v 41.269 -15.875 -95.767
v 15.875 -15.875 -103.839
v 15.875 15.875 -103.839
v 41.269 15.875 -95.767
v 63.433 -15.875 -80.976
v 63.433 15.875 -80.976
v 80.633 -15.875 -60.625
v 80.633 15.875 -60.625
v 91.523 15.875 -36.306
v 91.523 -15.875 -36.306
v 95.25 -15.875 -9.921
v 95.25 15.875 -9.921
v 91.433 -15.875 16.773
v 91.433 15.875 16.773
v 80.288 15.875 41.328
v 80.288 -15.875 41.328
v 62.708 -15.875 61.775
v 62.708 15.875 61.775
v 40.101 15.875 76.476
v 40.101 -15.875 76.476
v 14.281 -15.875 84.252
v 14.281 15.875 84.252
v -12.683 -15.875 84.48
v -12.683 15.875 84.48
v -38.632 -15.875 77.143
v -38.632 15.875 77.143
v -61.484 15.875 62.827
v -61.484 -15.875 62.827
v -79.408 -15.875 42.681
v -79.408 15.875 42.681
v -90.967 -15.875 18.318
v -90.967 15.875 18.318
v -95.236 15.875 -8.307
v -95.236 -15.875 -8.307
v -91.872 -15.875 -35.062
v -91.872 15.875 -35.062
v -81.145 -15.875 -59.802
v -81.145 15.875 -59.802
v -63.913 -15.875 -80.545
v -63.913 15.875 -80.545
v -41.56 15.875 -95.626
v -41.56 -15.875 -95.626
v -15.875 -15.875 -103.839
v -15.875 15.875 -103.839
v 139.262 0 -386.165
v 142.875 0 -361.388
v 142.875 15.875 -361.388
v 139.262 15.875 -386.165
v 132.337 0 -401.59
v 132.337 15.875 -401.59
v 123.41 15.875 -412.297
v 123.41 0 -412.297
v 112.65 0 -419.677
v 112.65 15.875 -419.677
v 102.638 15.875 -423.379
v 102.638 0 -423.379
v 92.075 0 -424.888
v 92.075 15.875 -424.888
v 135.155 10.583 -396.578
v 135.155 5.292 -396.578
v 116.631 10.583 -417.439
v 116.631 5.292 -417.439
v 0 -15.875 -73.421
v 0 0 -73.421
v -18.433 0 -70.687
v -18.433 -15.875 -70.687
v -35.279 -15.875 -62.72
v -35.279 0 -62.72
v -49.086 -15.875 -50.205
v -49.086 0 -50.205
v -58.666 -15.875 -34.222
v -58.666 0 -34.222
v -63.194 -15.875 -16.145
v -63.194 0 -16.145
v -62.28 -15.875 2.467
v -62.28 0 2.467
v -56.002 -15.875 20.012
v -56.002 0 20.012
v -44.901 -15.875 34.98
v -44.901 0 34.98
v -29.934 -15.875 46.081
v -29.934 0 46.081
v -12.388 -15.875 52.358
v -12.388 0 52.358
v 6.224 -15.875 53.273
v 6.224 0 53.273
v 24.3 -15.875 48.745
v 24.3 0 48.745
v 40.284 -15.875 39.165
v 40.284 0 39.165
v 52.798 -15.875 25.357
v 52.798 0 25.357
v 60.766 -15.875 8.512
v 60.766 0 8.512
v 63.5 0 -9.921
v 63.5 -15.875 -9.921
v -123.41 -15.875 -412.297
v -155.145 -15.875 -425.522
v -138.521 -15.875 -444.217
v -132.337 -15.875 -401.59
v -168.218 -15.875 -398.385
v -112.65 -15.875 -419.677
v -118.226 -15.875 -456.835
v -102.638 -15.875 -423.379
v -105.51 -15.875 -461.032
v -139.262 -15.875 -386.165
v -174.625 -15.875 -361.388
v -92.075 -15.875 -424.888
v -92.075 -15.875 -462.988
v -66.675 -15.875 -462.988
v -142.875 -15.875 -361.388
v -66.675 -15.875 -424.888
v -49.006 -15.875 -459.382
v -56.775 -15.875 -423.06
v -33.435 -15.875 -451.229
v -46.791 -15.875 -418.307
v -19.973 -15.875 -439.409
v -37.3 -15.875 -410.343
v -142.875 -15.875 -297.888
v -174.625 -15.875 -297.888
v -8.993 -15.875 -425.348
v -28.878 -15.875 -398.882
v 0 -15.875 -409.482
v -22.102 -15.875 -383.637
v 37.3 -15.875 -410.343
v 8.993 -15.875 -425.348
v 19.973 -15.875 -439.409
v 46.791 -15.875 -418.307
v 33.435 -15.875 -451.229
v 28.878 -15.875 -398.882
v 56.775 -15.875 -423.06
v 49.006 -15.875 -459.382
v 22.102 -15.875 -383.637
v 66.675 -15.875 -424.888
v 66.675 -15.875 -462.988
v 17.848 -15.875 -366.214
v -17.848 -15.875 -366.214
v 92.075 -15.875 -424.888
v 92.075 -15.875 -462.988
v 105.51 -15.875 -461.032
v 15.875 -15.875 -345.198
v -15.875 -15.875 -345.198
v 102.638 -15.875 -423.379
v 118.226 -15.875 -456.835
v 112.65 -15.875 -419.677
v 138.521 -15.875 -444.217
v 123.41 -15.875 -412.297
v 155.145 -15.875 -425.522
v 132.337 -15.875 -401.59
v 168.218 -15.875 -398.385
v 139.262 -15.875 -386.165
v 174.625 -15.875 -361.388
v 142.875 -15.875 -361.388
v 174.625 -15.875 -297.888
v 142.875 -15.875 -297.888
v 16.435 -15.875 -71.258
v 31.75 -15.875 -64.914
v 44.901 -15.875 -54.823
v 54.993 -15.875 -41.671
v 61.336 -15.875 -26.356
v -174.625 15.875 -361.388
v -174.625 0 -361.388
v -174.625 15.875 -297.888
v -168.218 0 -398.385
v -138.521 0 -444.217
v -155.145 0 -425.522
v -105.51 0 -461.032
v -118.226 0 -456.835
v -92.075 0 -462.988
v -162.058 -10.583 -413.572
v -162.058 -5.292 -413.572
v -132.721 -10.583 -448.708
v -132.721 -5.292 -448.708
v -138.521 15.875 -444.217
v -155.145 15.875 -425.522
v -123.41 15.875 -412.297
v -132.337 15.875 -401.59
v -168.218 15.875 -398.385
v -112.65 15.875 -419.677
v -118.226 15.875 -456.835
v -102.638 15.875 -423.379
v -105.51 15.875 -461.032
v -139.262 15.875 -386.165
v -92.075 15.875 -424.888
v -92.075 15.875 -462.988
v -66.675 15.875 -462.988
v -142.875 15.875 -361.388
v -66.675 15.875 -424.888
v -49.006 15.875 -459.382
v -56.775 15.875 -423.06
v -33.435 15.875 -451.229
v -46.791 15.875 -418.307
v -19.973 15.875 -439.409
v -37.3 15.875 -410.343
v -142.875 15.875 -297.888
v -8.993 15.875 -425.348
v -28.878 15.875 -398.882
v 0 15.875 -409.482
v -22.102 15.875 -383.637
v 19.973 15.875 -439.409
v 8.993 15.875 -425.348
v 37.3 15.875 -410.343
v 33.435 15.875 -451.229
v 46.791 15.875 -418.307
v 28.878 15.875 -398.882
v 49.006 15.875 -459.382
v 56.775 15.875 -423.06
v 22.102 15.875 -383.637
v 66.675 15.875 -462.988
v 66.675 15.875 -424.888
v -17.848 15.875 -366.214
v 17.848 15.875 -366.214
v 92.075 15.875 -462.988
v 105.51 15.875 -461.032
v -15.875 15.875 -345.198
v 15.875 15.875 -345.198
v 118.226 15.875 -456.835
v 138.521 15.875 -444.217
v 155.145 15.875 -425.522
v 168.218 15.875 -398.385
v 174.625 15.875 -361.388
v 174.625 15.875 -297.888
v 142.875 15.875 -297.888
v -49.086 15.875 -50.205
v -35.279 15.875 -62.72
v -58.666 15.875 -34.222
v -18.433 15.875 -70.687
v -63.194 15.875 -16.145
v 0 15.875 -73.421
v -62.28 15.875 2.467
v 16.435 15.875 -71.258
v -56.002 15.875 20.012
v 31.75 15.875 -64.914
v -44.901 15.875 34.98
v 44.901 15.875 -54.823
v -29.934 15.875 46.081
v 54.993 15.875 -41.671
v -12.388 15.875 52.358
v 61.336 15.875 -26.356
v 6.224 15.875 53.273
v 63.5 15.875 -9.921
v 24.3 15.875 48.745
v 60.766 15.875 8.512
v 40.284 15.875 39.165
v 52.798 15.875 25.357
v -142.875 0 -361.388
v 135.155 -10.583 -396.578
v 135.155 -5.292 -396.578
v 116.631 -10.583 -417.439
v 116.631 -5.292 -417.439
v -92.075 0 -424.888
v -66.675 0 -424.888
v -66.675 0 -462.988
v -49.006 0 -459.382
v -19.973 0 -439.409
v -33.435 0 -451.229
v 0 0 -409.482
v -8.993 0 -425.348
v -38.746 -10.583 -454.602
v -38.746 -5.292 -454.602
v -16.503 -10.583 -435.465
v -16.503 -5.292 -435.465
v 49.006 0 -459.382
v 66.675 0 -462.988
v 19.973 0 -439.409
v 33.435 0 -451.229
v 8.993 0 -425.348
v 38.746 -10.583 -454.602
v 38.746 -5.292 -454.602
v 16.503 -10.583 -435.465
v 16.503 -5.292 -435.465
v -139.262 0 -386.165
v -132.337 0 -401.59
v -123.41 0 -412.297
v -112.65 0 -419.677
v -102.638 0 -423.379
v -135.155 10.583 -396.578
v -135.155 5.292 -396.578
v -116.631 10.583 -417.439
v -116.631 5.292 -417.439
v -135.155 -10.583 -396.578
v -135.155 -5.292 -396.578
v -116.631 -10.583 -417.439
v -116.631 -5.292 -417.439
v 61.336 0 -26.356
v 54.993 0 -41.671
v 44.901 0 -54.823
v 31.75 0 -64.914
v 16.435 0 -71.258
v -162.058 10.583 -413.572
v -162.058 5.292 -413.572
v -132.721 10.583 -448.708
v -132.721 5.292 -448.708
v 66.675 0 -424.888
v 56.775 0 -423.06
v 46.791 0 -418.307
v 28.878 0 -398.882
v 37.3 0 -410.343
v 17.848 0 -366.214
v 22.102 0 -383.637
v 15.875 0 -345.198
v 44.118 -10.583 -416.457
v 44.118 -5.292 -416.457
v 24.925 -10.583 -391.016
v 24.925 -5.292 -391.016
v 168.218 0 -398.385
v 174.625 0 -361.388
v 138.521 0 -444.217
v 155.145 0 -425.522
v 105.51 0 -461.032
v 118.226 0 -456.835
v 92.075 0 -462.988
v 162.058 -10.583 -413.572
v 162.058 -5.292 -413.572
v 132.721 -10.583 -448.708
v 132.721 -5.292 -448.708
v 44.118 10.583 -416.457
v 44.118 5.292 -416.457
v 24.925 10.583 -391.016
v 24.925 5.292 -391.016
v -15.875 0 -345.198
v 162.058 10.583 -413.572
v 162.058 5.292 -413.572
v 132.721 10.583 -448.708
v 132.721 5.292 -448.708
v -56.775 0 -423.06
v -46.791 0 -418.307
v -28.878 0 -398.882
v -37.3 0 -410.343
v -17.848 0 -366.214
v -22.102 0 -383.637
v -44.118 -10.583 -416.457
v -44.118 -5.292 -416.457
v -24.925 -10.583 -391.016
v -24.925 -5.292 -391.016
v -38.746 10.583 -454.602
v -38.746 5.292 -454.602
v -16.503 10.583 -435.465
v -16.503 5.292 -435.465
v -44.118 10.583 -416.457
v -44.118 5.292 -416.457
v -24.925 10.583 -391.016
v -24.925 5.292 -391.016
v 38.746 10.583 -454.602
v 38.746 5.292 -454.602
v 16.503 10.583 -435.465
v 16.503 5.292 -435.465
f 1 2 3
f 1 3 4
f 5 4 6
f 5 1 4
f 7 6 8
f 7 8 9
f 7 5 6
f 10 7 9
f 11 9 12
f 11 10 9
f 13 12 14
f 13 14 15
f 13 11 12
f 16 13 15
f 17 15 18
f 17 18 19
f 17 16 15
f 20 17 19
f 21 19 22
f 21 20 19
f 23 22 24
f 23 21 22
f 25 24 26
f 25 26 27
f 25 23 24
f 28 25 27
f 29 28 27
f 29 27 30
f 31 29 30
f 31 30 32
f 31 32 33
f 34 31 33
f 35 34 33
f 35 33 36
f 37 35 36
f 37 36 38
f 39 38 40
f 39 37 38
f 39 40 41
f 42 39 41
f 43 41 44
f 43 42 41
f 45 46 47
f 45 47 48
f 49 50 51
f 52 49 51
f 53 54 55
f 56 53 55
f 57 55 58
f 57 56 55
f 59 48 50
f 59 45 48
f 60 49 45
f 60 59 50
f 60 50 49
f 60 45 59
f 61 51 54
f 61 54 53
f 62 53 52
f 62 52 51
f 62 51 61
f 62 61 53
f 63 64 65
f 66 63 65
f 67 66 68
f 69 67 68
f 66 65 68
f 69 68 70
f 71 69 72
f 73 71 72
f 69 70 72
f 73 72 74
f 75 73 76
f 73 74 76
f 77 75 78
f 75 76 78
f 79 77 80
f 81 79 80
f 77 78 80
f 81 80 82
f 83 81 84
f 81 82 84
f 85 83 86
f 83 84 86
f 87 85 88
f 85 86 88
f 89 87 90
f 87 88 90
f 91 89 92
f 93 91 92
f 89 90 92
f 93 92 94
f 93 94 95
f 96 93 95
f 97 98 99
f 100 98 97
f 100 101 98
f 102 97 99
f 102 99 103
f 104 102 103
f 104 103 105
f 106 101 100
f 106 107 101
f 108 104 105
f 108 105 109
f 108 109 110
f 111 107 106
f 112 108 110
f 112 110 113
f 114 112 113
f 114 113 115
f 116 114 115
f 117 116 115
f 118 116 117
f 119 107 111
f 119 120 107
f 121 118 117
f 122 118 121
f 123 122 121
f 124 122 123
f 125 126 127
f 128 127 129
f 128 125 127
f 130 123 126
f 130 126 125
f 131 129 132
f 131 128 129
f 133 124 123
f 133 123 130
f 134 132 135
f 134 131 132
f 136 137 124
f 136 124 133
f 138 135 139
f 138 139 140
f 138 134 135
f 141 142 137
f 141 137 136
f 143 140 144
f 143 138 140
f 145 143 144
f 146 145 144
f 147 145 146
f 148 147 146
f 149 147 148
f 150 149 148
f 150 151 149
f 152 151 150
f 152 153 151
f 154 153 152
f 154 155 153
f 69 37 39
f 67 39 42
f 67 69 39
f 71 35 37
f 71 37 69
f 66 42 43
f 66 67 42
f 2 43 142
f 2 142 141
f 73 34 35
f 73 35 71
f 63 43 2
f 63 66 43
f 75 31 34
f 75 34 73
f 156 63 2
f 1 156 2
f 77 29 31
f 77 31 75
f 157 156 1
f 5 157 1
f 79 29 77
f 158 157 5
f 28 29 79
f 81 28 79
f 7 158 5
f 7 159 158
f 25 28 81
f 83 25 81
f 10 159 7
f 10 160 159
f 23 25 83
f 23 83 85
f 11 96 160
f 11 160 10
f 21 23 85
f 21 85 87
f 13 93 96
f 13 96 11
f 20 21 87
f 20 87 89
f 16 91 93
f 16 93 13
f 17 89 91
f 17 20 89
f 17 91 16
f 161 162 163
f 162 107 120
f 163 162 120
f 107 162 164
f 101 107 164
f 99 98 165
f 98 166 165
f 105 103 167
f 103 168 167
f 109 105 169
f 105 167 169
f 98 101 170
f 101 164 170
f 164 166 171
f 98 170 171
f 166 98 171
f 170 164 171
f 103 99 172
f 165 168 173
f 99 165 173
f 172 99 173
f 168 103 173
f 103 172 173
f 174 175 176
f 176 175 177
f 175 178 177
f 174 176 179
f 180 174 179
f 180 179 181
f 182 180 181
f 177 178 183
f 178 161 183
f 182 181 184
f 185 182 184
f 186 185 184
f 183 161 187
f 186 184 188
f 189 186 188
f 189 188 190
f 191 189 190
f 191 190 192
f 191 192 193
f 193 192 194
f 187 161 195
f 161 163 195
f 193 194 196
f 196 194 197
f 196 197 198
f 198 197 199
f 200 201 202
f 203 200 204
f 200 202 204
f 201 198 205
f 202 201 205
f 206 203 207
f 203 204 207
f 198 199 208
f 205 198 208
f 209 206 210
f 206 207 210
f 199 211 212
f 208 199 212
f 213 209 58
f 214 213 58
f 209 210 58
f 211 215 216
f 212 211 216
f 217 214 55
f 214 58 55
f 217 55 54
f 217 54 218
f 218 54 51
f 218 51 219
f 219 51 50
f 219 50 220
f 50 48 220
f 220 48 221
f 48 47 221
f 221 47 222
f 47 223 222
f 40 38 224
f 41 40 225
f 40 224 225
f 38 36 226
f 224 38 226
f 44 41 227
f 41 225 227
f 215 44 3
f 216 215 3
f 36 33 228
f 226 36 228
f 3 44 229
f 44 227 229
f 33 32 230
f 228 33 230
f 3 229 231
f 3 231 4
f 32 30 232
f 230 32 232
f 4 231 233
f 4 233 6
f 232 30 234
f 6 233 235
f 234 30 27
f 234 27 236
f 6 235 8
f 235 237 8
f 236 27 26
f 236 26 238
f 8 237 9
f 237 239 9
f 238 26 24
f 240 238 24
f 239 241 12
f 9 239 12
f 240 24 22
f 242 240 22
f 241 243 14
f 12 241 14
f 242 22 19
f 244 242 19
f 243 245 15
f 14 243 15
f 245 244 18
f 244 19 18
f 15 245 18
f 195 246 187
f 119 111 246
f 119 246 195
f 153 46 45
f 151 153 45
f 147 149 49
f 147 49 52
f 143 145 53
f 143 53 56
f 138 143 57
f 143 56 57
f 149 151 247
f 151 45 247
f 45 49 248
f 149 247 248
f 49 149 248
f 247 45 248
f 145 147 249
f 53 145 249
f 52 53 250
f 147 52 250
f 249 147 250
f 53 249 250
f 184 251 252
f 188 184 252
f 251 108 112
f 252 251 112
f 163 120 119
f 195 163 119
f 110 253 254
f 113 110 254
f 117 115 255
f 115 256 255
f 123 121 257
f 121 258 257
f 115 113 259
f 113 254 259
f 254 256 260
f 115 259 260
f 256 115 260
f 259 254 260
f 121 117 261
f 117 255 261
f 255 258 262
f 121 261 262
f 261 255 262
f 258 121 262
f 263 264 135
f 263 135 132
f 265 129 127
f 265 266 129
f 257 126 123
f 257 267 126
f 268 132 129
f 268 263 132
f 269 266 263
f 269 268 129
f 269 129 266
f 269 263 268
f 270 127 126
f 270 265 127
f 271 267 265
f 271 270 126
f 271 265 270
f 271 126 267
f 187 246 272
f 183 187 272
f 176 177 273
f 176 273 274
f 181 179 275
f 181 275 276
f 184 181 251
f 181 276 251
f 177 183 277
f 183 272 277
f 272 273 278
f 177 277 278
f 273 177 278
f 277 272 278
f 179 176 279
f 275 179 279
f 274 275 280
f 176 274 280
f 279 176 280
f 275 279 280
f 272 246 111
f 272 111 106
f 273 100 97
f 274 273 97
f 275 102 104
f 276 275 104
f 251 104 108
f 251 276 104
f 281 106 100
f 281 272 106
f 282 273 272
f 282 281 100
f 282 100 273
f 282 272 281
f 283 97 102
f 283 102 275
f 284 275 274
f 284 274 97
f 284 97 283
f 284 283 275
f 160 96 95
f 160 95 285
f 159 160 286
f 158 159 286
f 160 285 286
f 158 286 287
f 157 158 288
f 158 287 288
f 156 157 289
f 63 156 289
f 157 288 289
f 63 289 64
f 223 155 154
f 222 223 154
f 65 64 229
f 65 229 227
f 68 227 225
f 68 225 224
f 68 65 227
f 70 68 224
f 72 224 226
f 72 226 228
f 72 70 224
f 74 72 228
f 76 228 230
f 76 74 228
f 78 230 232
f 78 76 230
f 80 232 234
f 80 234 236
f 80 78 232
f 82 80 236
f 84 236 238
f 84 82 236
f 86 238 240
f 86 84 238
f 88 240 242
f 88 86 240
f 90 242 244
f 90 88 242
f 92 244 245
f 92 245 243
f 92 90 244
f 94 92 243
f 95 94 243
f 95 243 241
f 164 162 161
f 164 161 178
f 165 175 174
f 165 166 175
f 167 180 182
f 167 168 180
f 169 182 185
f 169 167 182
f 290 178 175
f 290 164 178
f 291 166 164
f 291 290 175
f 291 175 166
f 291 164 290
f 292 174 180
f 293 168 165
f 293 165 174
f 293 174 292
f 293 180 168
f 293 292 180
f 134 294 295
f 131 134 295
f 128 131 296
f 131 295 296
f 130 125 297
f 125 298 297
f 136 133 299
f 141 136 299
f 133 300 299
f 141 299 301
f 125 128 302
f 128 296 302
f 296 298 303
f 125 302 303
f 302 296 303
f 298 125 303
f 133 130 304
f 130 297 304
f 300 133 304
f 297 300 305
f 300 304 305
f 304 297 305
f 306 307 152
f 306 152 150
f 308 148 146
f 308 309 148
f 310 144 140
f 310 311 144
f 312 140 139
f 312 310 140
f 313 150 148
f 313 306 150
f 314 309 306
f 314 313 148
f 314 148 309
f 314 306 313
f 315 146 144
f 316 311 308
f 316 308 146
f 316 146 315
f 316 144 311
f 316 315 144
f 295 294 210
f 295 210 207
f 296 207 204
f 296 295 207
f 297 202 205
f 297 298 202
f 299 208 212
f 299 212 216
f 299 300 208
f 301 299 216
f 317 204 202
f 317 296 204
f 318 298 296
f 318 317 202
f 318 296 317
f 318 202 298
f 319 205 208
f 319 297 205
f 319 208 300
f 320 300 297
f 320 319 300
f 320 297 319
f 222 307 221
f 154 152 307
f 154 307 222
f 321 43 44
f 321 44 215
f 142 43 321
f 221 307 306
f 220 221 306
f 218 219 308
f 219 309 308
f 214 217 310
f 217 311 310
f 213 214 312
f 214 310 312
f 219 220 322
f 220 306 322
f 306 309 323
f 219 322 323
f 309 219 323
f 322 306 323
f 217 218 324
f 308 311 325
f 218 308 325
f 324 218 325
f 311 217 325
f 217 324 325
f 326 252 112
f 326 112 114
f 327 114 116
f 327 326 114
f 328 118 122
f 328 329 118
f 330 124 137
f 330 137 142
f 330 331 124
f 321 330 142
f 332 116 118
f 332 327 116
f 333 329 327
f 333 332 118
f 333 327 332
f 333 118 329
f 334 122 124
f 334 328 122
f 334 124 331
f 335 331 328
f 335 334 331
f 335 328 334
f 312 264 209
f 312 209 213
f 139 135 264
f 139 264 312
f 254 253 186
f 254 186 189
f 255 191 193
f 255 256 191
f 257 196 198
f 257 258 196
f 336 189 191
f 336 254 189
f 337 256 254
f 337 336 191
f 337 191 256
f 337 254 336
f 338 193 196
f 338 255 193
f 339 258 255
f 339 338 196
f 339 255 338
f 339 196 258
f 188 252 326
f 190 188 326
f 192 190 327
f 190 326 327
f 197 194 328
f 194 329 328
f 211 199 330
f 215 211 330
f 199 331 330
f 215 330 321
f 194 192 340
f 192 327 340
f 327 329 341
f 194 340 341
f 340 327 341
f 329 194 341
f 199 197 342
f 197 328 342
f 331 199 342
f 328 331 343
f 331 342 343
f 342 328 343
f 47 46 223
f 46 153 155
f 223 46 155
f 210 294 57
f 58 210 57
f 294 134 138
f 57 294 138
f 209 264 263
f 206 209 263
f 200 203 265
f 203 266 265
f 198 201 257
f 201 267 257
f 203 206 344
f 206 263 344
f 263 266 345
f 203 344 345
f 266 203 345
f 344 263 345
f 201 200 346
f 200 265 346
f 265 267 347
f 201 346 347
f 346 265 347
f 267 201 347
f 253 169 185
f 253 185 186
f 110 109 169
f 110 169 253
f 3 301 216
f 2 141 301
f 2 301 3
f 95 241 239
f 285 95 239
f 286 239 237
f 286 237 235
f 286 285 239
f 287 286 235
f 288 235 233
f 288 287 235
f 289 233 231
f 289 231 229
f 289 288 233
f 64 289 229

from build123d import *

# Parameters (mm, degrees)
F0_W     = 25.4
F0_H     = 38.1
F0_W_2   = 31.75
F0_H_2   = 63.5
F1_DEPTH = 15.875


with BuildPart() as f1:
    # F0 (on Front) → F1 (new body, symmetric)
    with BuildSketch(Plane.XZ):
        with BuildLine():
            Line((-15.875, -103.8391655019), (-15.875, -345.1981674205))
            Line((-15.875, -345.1981674205), (0, -345.1981674205))
            Line((0, -345.1981674205), (0, -105.1713989452))
            ThreePointArc((0, -105.1713989452), (-7.9654012916, -104.8377562407), (-15.875, -103.8391655019))
        make_face()
        with BuildLine():
            add(Edge.make_bspline(
                [(0, -409.482145582), (-10.3991862171, -388.0156164118), (-15.7271620535, -363.9765002128), (-15.875, -345.1981674205)],
                knots=[81.5477604067, 81.5477604067, 81.5477604067, 81.5477604067, 143.8364349915, 143.8364349915, 143.8364349915, 143.8364349915], degree=3))
            add(Edge.make_bspline(
                [(-66.675, -424.8878848455), (-44.6960218251, -423.8382875919), (-17.5926852971, -402.3276865482), (-15.875, -345.1981674205)],
                knots=[0, 0, 0, 0, 94.5044499655, 94.5044499655, 94.5044499655, 94.5044499655], degree=3))
            Line((-66.675, -424.8878848455), (-66.675, -462.9878848455))
            add(Edge.make_bspline(
                [(-66.675, -462.9878848455), (-35.9209941881, -461.2803468487), (-13.6145190391, -437.5859283193), (0, -409.482145582)],
                knots=[0, 0, 0, 0, 81.5477604067, 81.5477604067, 81.5477604067, 81.5477604067], degree=3))
        make_face()
        with BuildLine():
            Line((0, -345.1981674205), (-15.875, -345.1981674205))
            add(Edge.make_bspline(
                [(0, -409.482145582), (-10.3991862171, -388.0156164118), (-15.7271620535, -363.9765002128), (-15.875, -345.1981674205)],
                knots=[81.5477604067, 81.5477604067, 81.5477604067, 81.5477604067, 143.8364349915, 143.8364349915, 143.8364349915, 143.8364349915], degree=3))
            add(Edge.make_bspline(
                [(0, -409.482145582), (10.3991862171, -388.0156164118), (15.7271620535, -363.9765002128), (15.875, -345.1981674205)],
                knots=[81.5477604067, 81.5477604067, 81.5477604067, 81.5477604067, 143.8364349915, 143.8364349915, 143.8364349915, 143.8364349915], degree=3))
            Line((15.875, -345.1981674205), (0, -345.1981674205))
        make_face()
        with BuildLine():
            Line((0, -105.1713989452), (0, -345.1981674205))
            Line((0, -345.1981674205), (15.875, -345.1981674205))
            Line((15.875, -345.1981674205), (15.875, -103.8391655019))
            ThreePointArc((15.875, -103.8391655019), (7.9654012916, -104.8377562407), (0, -105.1713989452))
        make_face()
        with BuildLine():
            ThreePointArc((95.25, -9.9213989452), (-61.483610621, 62.8269902123), (-15.875, -103.8391655019))
            Line((-15.875, -103.8391655019), (-15.875, -91.1981674205))
            Line((-15.875, -91.1981674205), (0, -91.1981674205))
            Line((0, -91.1981674205), (15.875, -91.1981674205))
            Line((15.875, -91.1981674205), (15.875, -103.8391655019))
            ThreePointArc((15.875, -103.8391655019), (72.7483891574, -71.4050095662), (95.25, -9.9213989452))
        make_face()
        with BuildLine():
            ThreePointArc((63.5, -9.9213989452), (44.9012806053, -54.8226795505), (0, -73.4213989452))
            ThreePointArc((0, -73.4213989452), (-44.9012806053, 34.9798816602), (63.5, -9.9213989452))
        make_face(mode=Mode.SUBTRACT)
        with BuildLine():
            Line((-15.875, -91.1981674205), (-15.875, -103.8391655019))
            ThreePointArc((-15.875, -103.8391655019), (-7.9654012916, -104.8377562407), (0, -105.1713989452))
            Line((0, -105.1713989452), (0, -91.1981674205))
            Line((0, -91.1981674205), (-15.875, -91.1981674205))
        make_face()
        with Locations((-79.375, -443.9378848455)):
            Rectangle(F0_W, F0_H)
        with BuildLine():
            add(Edge.make_bspline(
                [(0, -409.482145582), (10.3991862171, -388.0156164118), (15.7271620535, -363.9765002128), (15.875, -345.1981674205)],
                knots=[81.5477604067, 81.5477604067, 81.5477604067, 81.5477604067, 143.8364349915, 143.8364349915, 143.8364349915, 143.8364349915], degree=3))
            add(Edge.make_bspline(
                [(66.675, -462.9878848455), (35.9209941881, -461.2803468487), (13.6145190391, -437.5859283193), (0, -409.482145582)],
                knots=[0, 0, 0, 0, 81.5477604067, 81.5477604067, 81.5477604067, 81.5477604067], degree=3))
            Line((66.675, -462.9878848455), (66.675, -424.8878848455))
            add(Edge.make_bspline(
                [(66.675, -424.8878848455), (44.6960218251, -423.8382875919), (17.5926852971, -402.3276865482), (15.875, -345.1981674205)],
                knots=[0, 0, 0, 0, 94.5044499655, 94.5044499655, 94.5044499655, 94.5044499655], degree=3))
        make_face()
        with BuildLine():
            Line((0, -91.1981674205), (0, -105.1713989452))
            ThreePointArc((0, -105.1713989452), (7.9654012916, -104.8377562407), (15.875, -103.8391655019))
            Line((15.875, -103.8391655019), (15.875, -91.1981674205))
            Line((15.875, -91.1981674205), (0, -91.1981674205))
        make_face()
        with BuildLine():
            Line((-92.075, -462.9878848455), (-92.075, -424.8878848455))
            add(Edge.make_bspline(
                [(-142.875, -361.3878848455), (-142.1477283955, -404.0485322475), (-118.0558662534, -423.8382875919), (-92.075, -424.8878848455)],
                knots=[0, 0, 0, 0, 81.3196778154, 81.3196778154, 81.3196778154, 81.3196778154], degree=3))
            Line((-142.875, -361.3878848455), (-174.625, -361.3878848455))
            add(Edge.make_bspline(
                [(-174.625, -361.3878848455), (-172.2625430346, -420.826792717), (-136.5549724221, -460.4062736034), (-92.075, -462.9878848455)],
                knots=[0, 0, 0, 0, 130.9086036134, 130.9086036134, 130.9086036134, 130.9086036134], degree=3))
        make_face()
        with Locations((79.375, -443.9378848455)):
            Rectangle(F0_W, F0_H)
        with Locations((-158.75, -329.6378848455)):
            Rectangle(F0_W_2, F0_H_2)
        with BuildLine():
            Line((92.075, -424.8878848455), (92.075, -462.9878848455))
            add(Edge.make_bspline(
                [(174.625, -361.3878848455), (172.2625430346, -420.826792717), (136.5549724221, -460.4062736034), (92.075, -462.9878848455)],
                knots=[0, 0, 0, 0, 130.9086036134, 130.9086036134, 130.9086036134, 130.9086036134], degree=3))
            Line((174.625, -361.3878848455), (142.875, -361.3878848455))
            add(Edge.make_bspline(
                [(142.875, -361.3878848455), (142.1477283955, -404.0485322475), (118.0558662534, -423.8382875919), (92.075, -424.8878848455)],
                knots=[0, 0, 0, 0, 81.3196778154, 81.3196778154, 81.3196778154, 81.3196778154], degree=3))
        make_face()
        with Locations((158.75, -329.6378848455)):
            Rectangle(F0_W_2, F0_H_2)
    extrude(amount=F1_DEPTH, both=True)


solid = f1.part
